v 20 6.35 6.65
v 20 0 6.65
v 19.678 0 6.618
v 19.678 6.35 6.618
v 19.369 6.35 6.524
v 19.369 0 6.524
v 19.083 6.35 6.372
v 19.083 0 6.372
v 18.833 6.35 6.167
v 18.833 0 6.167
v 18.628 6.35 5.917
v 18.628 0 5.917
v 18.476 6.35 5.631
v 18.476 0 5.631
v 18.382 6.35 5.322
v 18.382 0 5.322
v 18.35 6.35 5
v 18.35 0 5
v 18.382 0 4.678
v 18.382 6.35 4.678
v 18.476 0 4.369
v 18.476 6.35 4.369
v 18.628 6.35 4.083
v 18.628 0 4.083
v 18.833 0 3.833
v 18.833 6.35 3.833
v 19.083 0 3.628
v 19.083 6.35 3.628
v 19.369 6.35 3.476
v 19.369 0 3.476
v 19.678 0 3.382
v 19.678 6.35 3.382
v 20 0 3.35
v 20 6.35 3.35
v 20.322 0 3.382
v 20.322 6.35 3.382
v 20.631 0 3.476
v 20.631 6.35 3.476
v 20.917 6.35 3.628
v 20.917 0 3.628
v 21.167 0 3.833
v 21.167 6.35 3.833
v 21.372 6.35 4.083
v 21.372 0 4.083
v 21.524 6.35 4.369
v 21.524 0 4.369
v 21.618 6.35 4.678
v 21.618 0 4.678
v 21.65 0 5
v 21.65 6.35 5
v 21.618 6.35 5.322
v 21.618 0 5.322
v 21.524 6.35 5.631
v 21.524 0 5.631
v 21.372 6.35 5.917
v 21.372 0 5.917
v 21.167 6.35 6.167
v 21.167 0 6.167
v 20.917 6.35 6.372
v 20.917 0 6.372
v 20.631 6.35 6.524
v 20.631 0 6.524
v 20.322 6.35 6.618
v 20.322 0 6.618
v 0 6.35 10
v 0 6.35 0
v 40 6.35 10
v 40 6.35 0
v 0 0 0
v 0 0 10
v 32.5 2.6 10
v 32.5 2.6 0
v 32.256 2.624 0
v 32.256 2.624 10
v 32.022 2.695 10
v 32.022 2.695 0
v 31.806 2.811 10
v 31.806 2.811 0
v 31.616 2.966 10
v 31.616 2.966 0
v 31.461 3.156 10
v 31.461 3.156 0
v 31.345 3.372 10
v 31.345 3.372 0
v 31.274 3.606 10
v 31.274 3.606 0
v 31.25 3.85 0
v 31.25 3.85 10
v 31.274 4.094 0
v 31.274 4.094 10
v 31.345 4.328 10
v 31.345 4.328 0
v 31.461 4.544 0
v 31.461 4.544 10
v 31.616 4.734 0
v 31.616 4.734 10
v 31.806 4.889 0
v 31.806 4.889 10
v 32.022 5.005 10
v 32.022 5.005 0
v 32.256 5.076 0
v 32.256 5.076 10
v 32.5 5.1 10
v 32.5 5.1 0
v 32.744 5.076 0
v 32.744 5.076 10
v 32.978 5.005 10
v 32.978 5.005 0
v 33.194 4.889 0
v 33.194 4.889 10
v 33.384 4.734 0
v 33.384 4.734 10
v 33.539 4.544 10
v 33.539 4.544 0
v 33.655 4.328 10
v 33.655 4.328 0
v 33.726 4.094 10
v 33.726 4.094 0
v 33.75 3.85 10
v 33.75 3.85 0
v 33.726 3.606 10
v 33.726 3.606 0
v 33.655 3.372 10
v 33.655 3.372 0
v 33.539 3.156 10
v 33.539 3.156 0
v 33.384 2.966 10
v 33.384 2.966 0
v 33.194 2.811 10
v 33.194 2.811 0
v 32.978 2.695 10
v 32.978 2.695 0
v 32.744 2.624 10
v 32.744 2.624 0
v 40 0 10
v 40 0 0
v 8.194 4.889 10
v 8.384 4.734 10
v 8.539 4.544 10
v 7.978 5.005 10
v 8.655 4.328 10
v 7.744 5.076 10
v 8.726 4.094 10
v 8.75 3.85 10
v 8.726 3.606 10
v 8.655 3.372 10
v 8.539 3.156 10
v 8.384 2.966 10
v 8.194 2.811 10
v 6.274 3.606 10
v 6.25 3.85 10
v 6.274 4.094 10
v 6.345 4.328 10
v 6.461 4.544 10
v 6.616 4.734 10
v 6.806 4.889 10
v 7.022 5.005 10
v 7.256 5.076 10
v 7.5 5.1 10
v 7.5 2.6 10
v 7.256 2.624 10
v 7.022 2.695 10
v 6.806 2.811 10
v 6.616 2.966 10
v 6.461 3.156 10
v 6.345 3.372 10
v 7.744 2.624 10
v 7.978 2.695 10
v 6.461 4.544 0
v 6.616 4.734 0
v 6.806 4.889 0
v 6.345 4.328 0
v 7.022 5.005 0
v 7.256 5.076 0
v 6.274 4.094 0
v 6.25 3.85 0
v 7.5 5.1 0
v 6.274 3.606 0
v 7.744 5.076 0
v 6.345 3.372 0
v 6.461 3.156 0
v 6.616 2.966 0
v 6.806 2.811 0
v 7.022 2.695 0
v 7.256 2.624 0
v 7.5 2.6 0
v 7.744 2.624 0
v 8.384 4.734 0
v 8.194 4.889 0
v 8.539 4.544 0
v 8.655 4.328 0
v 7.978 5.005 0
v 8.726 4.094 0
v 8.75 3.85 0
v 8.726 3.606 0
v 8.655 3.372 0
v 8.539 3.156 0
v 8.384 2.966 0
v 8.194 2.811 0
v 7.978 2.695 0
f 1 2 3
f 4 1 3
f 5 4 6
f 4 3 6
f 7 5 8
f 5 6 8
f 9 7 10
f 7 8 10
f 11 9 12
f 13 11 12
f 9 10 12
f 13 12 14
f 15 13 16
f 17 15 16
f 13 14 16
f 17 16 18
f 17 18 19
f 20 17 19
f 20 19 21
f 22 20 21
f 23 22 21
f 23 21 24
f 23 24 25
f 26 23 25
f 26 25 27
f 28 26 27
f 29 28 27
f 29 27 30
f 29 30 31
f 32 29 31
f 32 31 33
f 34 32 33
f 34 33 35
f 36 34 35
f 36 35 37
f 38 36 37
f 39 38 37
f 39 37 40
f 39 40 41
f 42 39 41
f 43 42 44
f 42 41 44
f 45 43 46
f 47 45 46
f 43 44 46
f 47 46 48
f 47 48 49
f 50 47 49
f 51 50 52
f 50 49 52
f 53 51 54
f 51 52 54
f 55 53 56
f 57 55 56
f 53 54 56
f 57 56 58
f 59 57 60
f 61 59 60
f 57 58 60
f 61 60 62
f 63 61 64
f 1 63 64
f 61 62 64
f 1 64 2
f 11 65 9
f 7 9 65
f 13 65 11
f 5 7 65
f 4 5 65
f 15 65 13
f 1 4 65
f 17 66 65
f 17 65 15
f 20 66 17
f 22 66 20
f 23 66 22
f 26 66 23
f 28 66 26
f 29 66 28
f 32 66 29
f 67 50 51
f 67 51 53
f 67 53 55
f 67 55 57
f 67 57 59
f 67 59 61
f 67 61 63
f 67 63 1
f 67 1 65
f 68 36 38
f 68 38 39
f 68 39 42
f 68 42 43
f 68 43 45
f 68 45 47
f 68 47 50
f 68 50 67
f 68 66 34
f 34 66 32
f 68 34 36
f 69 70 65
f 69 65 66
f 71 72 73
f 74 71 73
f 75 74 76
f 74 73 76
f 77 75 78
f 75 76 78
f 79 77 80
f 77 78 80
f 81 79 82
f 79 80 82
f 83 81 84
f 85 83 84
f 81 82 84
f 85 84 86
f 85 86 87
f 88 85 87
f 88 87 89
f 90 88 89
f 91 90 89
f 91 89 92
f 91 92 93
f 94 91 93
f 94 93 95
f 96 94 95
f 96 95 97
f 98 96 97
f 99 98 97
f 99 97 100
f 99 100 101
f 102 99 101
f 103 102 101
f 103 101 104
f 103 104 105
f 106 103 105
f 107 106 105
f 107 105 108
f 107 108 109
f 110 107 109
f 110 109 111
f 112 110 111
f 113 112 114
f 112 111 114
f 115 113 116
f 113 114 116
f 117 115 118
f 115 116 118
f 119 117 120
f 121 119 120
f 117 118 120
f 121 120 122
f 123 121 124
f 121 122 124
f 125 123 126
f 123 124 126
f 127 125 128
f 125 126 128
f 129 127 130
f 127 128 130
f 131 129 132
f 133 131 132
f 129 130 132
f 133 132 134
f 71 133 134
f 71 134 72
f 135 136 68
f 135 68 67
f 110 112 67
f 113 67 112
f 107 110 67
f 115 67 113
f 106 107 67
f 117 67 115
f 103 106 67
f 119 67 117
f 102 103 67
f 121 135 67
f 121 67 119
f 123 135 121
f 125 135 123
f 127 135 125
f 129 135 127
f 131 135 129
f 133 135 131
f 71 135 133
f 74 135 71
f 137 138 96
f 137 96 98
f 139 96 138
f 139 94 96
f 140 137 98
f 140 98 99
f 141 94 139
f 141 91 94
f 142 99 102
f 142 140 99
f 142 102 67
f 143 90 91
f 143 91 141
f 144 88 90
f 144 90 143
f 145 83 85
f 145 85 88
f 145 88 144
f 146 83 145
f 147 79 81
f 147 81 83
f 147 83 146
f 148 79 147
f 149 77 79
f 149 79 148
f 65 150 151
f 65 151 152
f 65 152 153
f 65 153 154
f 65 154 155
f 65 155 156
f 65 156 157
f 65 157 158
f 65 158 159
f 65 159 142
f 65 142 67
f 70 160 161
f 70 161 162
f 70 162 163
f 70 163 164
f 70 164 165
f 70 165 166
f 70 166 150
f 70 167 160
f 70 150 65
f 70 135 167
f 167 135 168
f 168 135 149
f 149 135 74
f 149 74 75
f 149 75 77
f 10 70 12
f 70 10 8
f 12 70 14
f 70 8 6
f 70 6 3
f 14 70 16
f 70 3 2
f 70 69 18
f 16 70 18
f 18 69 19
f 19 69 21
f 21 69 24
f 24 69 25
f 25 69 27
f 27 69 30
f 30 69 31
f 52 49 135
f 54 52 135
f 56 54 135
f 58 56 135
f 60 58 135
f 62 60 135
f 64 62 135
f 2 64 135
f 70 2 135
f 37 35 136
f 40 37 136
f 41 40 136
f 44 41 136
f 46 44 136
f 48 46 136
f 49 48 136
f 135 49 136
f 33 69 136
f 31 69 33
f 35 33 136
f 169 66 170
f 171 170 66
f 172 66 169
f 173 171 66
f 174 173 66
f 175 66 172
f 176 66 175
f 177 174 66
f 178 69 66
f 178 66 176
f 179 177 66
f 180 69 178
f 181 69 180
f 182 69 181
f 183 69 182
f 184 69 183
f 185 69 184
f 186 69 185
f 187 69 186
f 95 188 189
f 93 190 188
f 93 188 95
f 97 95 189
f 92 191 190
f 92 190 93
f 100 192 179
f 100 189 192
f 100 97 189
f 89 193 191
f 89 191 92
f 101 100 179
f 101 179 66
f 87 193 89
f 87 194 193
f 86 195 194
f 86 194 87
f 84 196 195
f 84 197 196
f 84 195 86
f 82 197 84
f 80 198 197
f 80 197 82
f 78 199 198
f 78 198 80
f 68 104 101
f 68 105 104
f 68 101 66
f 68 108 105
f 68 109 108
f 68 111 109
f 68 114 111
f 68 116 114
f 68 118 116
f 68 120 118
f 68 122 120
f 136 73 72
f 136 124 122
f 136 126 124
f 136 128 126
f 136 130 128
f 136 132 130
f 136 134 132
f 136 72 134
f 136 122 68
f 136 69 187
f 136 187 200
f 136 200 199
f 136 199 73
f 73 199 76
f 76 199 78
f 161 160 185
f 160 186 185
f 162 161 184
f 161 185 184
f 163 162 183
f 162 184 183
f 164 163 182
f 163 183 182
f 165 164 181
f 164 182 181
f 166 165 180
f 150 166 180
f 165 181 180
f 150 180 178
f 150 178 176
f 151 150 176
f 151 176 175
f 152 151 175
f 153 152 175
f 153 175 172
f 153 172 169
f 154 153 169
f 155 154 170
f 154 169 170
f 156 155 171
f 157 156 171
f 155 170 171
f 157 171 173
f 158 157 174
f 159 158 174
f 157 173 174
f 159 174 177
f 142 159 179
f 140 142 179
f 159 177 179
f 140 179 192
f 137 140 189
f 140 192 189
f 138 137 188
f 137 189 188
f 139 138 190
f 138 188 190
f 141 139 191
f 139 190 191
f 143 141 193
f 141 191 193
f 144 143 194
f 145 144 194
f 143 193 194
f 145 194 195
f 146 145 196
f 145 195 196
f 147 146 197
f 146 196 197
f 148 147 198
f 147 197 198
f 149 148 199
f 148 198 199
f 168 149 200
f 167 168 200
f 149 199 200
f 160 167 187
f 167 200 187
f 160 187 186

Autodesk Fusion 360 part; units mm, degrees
sketch "Sketch1" plane through (0, 0, 0) normal (0, 1, 0) x (1, 0, 0)
  line L0 (0, 0) -> (40, 0)
  line L1 (40, 0) -> (40, -10)
  line L2 (40, -10) -> (0, -10)
  line L3 (0, -10) -> (0, 0)
  dimension "d1" = 40
  dimension "d2" = 10
extrude "Extrude1" add sketch "Sketch1" along normal blind 6.35
sketch "Sketch2" plane through (0, 6.35, 0) normal (0, 1, 0) x (-1, 0, 0)
  line L0 (0, 10) -> (-40, 10)
  line L1 (-40, 10) -> (-40, 0)
  line L2 (-40, 0) -> (0, 0)
  line L3 (0, 0) -> (0, 10)
  line L4 (0, 5) -> (-40, 5) construction
  point P0 (-20, 5)
hole "Hole1" at (20, 6.35, 5) direction (0, -1, 0) diameter 3.3 end through all
sketch "Sketch3" plane through (0, 0, 10) normal (0, 0, 1) x (1, 0, 0)
  line L0 (0, 0) -> (40, 0)
  line L1 (40, 0) -> (40, 6.35)
  line L2 (40, 6.35) -> (0, 6.35)
  line L3 (0, 6.35) -> (0, 0)
  line L4 (0, 3.85) -> (39.5878, 3.85) construction
  point P0 (7.5, 3.85)
  point P1 (32.5, 3.85)
  dimension "d10" = 7.5
  dimension "d11" = 25
  dimension "d18" = 2.5
hole "Hole4" at (7.5, 3.85, 10) direction (0, 0, -1) diameter 2.5 end through all
hole "Hole5" at (32.5, 3.85, 10) direction (0, 0, -1) diameter 2.5 end through all
hole "Hole2" [suppressed]
hole "Hole3" [suppressed]
